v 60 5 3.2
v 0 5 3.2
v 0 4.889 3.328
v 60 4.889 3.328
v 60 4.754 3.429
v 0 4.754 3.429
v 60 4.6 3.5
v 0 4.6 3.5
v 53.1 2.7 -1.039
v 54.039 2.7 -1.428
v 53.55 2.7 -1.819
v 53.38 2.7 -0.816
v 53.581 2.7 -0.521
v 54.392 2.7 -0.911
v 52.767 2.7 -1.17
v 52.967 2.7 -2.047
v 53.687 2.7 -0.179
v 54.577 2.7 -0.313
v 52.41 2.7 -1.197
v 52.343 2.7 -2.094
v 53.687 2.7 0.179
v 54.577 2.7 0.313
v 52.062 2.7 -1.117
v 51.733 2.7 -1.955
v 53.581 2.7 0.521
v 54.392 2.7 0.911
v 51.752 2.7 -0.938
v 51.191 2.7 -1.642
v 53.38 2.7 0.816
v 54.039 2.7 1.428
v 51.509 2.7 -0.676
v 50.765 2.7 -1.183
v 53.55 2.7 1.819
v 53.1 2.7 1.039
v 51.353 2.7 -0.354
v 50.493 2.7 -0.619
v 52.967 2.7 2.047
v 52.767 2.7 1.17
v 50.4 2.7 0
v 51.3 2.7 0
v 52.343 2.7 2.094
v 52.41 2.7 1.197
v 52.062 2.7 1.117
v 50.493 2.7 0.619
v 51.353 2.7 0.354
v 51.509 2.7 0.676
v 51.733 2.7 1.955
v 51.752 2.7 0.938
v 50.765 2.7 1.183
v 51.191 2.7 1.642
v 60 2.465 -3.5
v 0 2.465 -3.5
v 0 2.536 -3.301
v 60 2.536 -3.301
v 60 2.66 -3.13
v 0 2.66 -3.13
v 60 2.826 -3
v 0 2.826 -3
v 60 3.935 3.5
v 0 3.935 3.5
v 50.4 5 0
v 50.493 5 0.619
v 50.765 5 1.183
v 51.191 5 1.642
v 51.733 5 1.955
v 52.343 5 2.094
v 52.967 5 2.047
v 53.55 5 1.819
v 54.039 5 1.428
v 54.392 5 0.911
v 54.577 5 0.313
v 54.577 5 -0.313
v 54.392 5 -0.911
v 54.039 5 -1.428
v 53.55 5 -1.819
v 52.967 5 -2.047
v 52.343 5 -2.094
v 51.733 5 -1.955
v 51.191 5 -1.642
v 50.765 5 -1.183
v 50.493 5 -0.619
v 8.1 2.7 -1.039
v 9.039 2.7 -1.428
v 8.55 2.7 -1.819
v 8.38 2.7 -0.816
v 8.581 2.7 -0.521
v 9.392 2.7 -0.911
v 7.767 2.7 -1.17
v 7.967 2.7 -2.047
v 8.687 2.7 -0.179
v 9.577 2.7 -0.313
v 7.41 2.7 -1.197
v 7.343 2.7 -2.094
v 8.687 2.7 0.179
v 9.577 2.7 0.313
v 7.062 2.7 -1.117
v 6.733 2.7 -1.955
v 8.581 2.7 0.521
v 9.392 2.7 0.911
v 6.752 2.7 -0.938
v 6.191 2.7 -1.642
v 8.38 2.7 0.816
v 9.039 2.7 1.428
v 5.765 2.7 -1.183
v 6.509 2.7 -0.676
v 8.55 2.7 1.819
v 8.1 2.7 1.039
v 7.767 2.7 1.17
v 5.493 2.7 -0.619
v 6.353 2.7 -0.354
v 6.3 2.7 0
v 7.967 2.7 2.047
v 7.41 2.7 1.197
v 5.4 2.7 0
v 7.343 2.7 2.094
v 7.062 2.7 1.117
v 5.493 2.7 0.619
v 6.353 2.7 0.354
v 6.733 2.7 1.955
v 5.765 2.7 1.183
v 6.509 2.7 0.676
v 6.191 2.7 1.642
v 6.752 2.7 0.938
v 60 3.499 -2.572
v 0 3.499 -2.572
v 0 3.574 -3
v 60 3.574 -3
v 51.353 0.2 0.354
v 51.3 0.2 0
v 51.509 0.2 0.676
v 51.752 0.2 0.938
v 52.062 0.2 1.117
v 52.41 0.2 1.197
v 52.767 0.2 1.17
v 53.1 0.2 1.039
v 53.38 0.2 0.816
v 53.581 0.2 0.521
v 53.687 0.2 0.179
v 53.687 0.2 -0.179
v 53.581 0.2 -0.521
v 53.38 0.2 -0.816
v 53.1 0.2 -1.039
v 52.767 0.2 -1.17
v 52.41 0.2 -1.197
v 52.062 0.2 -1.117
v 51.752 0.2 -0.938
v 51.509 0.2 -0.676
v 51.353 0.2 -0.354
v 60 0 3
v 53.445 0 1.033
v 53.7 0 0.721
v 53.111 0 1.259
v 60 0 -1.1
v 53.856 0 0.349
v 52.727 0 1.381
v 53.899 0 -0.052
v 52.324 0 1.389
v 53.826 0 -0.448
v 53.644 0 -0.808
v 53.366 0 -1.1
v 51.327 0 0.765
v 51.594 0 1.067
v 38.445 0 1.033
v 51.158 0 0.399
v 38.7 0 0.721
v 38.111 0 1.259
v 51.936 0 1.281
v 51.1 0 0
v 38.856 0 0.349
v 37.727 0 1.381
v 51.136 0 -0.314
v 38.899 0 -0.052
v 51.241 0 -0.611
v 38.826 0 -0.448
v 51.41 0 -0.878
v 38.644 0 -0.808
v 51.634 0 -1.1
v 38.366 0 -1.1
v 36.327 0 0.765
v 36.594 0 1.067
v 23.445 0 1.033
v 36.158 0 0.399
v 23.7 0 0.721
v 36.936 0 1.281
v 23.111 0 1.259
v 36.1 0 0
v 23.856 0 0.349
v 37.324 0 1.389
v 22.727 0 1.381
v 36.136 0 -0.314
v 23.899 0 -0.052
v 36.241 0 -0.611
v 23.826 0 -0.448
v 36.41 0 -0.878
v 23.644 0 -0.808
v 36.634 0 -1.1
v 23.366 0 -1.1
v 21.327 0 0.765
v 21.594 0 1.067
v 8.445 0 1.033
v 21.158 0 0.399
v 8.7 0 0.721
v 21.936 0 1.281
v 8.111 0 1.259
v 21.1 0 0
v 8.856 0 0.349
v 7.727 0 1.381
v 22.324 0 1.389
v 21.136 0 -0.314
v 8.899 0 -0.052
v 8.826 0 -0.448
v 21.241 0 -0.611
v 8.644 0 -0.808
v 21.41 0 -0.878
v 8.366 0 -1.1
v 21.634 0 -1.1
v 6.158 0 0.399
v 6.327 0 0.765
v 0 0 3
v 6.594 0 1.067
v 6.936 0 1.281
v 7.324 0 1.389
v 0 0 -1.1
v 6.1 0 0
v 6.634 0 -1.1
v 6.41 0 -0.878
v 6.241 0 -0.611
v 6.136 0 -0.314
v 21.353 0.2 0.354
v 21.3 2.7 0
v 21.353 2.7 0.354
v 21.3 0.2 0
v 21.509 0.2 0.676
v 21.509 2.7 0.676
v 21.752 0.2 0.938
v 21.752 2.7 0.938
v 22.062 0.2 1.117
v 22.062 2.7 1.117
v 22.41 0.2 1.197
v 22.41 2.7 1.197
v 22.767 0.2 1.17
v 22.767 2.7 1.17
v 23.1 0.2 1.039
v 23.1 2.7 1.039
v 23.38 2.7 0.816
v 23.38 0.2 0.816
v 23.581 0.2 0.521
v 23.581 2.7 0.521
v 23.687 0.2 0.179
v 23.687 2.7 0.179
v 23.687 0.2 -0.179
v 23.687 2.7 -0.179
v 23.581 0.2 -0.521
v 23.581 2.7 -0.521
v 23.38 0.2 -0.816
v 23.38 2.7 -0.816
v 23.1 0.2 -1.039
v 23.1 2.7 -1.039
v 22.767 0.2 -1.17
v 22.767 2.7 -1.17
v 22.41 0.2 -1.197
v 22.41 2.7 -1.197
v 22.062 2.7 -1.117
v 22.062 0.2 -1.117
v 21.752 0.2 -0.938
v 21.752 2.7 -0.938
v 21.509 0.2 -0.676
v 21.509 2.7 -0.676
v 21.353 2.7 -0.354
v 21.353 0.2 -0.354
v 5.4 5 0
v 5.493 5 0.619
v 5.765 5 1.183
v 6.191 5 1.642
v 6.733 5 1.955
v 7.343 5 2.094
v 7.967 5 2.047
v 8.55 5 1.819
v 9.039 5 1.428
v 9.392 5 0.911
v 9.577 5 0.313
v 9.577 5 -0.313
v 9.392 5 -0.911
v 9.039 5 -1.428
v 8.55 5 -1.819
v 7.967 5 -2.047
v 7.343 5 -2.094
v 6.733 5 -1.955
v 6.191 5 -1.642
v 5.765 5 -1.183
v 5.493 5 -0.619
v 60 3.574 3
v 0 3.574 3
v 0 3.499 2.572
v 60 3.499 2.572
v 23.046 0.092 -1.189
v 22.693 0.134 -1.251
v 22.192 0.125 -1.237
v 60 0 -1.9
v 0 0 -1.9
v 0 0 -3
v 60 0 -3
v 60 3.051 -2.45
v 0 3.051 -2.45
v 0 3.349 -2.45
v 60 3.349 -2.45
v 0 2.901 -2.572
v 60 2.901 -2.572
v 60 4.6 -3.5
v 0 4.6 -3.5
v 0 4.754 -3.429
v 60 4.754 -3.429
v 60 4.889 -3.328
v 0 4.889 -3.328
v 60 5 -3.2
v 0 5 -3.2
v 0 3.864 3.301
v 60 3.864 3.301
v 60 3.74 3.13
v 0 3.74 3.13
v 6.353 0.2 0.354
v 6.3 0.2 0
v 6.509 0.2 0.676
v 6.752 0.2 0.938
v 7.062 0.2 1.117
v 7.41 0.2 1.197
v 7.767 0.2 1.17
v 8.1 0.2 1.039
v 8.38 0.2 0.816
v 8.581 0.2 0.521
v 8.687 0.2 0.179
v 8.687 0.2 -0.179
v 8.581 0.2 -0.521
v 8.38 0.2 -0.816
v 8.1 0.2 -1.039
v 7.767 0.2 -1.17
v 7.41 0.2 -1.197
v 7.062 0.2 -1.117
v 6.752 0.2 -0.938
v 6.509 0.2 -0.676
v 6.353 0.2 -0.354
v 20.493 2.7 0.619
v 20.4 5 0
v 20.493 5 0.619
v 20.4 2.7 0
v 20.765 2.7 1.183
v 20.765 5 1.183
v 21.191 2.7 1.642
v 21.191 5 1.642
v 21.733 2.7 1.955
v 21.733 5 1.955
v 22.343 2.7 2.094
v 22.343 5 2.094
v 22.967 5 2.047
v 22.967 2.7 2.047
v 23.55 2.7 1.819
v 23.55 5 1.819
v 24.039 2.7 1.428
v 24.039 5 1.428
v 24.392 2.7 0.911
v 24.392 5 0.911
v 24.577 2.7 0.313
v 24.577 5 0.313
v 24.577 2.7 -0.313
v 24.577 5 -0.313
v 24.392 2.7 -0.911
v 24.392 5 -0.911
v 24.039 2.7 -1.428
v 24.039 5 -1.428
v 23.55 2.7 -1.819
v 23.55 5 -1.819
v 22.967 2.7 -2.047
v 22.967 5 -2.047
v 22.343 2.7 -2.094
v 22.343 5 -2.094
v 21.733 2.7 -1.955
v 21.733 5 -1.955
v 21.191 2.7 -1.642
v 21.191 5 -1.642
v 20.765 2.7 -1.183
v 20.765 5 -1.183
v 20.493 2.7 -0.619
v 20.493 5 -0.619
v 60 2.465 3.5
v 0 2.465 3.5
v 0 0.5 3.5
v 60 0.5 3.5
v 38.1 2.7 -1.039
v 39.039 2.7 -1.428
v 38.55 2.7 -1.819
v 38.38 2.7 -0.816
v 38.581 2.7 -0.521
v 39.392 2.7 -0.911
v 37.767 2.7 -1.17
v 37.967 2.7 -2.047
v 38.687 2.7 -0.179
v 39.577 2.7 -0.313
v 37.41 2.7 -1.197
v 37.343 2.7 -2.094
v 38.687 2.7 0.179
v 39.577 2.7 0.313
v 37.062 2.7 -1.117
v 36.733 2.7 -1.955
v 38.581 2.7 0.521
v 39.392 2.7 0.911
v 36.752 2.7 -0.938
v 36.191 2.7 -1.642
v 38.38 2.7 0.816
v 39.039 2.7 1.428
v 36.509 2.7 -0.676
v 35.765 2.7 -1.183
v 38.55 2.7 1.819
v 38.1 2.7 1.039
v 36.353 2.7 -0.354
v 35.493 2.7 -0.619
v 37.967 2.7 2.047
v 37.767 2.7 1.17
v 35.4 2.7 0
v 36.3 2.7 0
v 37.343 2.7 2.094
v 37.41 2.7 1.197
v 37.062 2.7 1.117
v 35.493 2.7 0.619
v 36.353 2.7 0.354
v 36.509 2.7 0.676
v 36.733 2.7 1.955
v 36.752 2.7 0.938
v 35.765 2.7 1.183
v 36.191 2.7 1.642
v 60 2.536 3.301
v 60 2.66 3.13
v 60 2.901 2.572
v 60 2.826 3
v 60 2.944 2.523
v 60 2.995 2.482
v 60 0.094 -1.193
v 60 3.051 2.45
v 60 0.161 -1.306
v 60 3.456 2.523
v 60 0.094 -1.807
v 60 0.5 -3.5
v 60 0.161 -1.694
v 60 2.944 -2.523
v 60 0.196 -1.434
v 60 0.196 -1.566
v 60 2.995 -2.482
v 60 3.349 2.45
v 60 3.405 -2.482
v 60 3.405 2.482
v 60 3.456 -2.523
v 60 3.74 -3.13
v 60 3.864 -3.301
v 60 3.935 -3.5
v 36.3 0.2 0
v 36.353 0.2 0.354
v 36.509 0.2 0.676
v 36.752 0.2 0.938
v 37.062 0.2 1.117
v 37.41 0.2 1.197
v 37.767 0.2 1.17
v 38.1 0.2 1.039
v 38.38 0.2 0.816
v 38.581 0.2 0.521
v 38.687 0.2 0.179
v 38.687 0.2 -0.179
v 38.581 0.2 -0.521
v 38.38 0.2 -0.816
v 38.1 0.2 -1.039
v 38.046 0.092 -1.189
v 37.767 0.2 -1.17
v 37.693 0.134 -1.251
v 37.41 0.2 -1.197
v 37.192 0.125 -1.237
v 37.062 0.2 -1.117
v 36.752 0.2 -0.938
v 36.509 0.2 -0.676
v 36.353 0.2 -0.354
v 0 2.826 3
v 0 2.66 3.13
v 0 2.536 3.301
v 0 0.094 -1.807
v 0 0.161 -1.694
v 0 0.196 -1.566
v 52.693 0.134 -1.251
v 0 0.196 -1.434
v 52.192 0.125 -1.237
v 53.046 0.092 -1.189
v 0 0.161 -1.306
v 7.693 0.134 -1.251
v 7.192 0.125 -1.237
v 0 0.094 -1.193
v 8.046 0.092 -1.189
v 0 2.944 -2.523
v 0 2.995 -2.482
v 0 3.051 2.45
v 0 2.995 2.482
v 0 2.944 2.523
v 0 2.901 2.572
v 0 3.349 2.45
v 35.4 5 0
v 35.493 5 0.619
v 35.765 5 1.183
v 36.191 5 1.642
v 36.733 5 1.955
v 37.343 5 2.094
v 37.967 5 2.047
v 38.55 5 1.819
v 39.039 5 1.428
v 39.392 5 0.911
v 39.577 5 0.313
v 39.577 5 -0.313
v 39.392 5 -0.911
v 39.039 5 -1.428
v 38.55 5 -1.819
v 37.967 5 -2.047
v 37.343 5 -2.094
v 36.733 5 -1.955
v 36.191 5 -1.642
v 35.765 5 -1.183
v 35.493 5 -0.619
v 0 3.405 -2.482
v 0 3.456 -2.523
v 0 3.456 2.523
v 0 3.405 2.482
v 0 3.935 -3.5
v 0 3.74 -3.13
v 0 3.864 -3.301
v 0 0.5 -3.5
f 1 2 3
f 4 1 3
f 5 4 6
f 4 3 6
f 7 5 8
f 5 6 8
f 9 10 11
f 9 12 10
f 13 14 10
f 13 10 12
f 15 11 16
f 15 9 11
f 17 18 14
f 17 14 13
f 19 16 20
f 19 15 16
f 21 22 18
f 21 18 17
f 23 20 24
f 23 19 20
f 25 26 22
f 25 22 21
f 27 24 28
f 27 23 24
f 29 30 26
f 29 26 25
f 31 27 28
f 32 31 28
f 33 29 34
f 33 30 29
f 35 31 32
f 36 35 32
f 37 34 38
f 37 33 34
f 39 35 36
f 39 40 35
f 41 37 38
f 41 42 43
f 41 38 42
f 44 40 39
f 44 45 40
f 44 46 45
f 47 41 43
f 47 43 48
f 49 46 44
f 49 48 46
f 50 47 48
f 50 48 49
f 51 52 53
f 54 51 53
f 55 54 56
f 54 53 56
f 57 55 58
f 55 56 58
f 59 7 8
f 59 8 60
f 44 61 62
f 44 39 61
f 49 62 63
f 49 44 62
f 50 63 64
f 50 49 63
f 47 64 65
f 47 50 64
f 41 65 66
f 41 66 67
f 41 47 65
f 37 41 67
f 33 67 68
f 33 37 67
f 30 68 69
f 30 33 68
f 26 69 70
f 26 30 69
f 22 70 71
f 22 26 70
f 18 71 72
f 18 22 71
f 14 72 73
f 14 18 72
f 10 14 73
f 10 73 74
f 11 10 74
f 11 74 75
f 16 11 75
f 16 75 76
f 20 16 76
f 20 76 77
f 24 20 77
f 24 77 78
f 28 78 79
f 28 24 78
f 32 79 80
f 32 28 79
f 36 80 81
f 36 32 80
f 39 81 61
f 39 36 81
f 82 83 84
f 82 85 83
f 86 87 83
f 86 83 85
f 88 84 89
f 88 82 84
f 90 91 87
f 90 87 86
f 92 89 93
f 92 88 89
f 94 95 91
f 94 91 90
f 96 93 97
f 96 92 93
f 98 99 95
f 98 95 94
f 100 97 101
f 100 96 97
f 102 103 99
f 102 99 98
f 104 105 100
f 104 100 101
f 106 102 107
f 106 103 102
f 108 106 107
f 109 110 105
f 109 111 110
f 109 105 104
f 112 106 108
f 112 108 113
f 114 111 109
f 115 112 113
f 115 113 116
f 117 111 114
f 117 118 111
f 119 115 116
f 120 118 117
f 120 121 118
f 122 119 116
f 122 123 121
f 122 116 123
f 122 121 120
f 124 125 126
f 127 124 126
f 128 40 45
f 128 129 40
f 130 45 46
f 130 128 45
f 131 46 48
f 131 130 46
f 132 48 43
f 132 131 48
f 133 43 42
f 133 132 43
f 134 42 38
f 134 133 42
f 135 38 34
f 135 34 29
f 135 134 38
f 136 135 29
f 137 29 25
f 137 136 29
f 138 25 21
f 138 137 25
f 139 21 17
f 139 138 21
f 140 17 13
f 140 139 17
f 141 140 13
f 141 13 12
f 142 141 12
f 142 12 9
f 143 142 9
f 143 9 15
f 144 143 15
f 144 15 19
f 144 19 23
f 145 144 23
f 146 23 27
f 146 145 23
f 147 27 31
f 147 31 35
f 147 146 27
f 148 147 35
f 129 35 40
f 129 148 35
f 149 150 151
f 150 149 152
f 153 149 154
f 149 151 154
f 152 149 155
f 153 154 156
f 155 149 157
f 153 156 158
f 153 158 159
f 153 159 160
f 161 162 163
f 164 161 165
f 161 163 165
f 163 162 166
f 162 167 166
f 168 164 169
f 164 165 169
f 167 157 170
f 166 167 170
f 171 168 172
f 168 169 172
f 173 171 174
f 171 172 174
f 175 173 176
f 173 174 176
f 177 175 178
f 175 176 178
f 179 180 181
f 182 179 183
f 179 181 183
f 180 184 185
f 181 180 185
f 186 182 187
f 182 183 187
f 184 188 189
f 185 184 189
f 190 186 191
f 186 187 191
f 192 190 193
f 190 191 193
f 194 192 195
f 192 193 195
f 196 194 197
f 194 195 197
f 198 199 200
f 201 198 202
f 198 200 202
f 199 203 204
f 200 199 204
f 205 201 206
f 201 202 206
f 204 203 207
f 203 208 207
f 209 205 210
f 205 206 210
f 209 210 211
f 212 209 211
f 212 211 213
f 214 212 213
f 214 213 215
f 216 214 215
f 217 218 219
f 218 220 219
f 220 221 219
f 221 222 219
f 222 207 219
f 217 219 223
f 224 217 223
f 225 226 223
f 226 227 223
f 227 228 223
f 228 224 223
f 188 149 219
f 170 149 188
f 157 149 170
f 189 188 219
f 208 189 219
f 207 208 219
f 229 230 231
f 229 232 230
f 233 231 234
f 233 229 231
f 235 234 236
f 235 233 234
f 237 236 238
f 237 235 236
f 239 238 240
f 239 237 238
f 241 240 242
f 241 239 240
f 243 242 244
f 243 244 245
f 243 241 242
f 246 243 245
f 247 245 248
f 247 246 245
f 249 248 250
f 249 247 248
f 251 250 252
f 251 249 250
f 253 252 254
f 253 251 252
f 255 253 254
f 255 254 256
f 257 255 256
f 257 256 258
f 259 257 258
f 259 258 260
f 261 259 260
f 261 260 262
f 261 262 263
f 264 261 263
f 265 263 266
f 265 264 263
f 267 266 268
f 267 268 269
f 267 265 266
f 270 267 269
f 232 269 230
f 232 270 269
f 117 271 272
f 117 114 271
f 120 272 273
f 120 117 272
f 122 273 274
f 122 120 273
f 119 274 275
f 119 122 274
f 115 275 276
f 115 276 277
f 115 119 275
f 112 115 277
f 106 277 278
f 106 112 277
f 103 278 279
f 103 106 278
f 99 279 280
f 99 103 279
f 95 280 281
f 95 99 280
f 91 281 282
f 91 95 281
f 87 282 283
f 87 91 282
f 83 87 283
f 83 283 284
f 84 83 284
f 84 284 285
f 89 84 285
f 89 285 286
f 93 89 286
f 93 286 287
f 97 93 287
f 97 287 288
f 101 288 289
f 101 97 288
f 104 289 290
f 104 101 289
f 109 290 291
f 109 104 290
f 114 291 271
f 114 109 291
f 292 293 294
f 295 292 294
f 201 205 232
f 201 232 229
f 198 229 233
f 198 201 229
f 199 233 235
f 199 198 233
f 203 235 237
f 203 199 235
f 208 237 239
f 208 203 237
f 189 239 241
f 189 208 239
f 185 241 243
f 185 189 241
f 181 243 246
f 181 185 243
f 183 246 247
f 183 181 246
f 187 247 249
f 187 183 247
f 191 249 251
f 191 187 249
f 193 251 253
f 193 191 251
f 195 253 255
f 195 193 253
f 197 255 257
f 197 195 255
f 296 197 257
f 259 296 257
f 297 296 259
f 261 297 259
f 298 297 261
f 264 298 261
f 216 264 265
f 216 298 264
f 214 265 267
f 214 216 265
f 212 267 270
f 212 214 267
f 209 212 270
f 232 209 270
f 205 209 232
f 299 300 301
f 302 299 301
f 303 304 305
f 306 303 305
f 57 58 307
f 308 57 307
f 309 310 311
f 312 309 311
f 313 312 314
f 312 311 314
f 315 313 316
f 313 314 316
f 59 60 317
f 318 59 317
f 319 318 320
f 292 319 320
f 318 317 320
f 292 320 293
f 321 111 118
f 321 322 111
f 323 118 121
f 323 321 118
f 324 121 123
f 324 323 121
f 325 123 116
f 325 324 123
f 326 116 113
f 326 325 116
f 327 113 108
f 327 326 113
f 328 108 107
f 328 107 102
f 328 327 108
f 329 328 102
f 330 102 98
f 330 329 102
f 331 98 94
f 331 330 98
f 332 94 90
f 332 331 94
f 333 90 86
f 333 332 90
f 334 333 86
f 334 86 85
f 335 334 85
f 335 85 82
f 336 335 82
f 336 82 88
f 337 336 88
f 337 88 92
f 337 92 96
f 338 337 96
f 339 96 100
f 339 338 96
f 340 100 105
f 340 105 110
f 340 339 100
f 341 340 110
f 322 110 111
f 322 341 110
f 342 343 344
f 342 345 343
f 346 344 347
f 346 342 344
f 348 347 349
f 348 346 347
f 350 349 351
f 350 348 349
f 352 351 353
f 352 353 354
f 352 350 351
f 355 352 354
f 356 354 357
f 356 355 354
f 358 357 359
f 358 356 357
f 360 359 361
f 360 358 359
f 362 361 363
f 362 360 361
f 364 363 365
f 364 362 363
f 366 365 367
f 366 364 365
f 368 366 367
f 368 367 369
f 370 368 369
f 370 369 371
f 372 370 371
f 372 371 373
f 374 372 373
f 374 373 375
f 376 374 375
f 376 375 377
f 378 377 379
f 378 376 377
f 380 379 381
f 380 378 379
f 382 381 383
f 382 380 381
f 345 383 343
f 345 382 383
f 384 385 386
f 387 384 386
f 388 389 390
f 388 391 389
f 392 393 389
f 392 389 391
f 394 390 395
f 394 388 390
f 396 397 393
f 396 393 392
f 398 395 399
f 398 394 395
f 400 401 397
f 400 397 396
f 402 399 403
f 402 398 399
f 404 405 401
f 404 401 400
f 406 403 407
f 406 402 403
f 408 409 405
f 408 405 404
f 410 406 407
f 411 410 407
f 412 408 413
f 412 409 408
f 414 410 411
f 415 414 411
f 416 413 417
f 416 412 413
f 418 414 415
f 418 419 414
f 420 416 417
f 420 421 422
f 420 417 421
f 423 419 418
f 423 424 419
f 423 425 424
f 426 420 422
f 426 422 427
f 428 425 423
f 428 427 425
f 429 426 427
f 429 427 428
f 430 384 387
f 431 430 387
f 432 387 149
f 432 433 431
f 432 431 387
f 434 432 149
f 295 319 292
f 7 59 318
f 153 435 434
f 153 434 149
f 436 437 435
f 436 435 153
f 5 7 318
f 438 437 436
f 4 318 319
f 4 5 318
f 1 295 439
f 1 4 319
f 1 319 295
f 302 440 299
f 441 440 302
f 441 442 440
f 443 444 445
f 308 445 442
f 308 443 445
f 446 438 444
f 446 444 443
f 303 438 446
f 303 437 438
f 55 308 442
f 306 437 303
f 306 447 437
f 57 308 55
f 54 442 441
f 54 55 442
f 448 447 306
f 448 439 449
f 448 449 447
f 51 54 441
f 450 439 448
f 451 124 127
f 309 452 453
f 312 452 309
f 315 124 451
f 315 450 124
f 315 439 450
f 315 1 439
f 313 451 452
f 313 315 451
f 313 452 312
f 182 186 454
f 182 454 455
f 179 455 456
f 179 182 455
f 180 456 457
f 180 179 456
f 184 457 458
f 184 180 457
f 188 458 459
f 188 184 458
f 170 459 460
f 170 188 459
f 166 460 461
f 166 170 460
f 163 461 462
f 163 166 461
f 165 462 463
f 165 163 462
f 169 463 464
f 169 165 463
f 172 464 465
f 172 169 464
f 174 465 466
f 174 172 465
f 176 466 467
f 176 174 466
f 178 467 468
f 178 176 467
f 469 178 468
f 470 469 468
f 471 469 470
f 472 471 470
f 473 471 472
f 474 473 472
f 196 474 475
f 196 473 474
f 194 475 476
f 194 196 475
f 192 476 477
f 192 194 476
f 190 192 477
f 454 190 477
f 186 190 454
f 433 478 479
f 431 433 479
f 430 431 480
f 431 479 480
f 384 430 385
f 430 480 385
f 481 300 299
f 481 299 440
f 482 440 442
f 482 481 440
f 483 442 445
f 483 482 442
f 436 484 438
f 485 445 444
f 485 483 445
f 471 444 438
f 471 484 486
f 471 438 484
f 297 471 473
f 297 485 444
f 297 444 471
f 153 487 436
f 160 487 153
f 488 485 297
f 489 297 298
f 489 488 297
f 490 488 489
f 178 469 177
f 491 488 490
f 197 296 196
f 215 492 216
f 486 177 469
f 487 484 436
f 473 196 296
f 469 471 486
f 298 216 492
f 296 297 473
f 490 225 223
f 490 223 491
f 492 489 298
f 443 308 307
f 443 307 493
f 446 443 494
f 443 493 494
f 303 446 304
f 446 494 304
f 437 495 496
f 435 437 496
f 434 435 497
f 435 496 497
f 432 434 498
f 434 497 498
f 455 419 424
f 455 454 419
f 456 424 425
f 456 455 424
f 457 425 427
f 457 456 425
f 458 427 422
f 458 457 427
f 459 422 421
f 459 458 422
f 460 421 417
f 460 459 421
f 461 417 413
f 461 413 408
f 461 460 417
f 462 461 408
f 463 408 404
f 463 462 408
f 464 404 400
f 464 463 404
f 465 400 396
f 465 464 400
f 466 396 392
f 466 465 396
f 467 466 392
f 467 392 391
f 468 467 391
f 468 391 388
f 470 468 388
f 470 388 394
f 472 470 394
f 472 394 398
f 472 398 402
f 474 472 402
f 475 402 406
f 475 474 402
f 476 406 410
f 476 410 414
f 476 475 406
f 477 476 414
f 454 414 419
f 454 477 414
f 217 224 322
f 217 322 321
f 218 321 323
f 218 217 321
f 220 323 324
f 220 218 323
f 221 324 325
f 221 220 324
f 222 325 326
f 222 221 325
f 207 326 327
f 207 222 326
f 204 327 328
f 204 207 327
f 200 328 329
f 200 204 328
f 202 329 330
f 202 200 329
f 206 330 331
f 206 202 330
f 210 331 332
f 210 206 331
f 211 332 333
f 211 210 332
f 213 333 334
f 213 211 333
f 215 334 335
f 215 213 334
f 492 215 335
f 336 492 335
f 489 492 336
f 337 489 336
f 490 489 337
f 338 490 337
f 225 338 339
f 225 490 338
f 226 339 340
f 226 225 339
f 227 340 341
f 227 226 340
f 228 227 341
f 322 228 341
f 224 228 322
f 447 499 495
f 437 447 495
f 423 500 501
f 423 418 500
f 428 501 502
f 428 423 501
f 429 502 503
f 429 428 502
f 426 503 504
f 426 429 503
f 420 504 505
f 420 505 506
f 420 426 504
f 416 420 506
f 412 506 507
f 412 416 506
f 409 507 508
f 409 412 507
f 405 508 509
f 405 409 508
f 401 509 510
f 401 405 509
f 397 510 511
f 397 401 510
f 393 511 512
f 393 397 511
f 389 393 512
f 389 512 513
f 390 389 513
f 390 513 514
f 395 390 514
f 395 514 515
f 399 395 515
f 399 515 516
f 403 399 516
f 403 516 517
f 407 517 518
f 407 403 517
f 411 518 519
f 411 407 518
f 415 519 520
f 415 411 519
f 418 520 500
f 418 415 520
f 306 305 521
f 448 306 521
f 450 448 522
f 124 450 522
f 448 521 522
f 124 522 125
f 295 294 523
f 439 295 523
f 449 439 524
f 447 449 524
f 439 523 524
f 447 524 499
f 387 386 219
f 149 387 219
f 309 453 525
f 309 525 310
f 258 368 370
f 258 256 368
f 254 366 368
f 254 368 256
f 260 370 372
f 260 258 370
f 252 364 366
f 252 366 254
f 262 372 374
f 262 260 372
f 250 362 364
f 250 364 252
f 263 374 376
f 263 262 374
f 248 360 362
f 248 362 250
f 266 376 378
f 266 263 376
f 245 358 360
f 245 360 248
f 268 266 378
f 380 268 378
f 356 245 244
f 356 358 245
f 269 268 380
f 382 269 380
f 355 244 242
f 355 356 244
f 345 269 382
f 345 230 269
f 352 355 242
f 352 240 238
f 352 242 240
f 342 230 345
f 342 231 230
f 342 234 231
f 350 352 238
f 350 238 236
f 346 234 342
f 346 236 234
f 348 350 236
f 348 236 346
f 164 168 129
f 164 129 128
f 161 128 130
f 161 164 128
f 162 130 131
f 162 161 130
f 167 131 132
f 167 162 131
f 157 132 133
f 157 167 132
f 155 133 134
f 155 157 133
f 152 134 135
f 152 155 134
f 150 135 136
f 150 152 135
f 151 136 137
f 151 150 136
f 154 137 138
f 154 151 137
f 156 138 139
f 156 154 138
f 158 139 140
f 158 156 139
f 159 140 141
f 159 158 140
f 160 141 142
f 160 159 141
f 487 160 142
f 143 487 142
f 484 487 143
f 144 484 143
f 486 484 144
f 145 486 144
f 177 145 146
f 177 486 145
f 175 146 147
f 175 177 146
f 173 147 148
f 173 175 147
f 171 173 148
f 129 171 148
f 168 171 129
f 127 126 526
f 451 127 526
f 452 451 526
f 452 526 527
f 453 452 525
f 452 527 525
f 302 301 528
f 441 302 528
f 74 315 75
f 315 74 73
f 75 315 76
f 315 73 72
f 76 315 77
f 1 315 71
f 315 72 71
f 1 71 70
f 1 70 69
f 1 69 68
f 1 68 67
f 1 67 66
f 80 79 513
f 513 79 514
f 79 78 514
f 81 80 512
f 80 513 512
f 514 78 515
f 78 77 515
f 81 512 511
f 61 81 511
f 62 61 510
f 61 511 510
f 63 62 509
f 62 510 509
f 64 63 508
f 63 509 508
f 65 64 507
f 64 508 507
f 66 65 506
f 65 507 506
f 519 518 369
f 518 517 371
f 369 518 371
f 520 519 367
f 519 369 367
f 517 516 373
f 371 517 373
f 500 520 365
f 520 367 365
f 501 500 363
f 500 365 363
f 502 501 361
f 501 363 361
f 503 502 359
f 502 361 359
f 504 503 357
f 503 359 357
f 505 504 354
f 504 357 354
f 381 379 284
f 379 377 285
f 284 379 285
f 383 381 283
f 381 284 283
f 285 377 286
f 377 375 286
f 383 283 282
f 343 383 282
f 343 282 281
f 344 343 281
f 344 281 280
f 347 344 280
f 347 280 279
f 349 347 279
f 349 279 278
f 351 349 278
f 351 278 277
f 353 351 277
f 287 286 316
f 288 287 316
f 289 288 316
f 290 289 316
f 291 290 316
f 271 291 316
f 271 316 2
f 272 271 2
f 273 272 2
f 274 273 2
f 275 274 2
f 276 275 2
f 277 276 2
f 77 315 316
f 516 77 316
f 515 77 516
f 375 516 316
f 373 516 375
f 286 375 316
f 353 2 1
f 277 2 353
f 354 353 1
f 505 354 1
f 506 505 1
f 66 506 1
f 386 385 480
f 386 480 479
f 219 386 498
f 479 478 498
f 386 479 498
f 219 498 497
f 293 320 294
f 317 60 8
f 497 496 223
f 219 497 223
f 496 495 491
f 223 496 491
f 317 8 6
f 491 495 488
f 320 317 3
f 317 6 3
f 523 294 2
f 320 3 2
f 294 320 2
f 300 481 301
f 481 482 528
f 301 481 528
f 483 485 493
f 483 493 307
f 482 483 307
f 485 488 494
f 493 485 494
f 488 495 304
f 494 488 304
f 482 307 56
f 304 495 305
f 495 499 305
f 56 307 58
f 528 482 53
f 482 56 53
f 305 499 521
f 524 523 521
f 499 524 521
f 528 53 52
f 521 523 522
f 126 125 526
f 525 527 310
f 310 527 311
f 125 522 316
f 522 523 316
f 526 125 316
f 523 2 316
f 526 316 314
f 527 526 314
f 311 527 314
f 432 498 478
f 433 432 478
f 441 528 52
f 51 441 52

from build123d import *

# Parameters (mm, degrees)
EXTRUDE1_DEPTH  = 60
SKETCH6_R       = 0.5
EXTRUDE2_DEPTH  = 61
LPATTERN1_COUNT = 3
LPATTERN1_PITCH = 15


with BuildPart() as part:
    # Sketch1 → Extrude1 (new body)
    with BuildSketch(Plane(origin=(0, 0, 0), x_dir=(0, 0, -1), z_dir=(1, 0, 0))):
        with BuildLine():
            Line((-3.5, 0.5), (-3, 0))
            Line((-3, 0), (3, 0))
            Line((3, 0), (3.5, 0.5))
            Line((3.5, 0.5), (3.5, 2.465153077))
            ThreePointArc((3.5, 2.465153077), (3.211148341, 2.591798371), (2.999904622, 2.826))
            Line((2.999904622, 2.826), (2.572, 2.90145113))
            ThreePointArc((2.572, 2.90145113), (2.501845147, 2.968757157), (2.45, 3.051))
            Line((2.45, 3.051), (2.45, 3.349))
            ThreePointArc((2.45, 3.349), (2.501845147, 3.431242843), (2.572, 3.49854887))
            Line((2.572, 3.49854887), (2.999904622, 3.574))
            ThreePointArc((2.999904622, 3.574), (3.211148341, 3.808201629), (3.5, 3.934846923))
            Line((3.5, 3.934846923), (3.5, 4.6))
            ThreePointArc((3.5, 4.6), (3.382052634, 4.824039475), (3.2, 5))
            Line((3.2, 5), (-3.2, 5))
            ThreePointArc((-3.2, 5), (-3.382052634, 4.824039475), (-3.5, 4.6))
            Line((-3.5, 4.6), (-3.5, 3.934846923))
            ThreePointArc((-3.5, 3.934846923), (-3.211148341, 3.808201629), (-2.999904622, 3.574))
            Line((-2.999904622, 3.574), (-2.572, 3.49854887))
            ThreePointArc((-2.572, 3.49854887), (-2.501845147, 3.431242843), (-2.45, 3.349))
            Line((-2.45, 3.349), (-2.45, 3.051))
            ThreePointArc((-2.45, 3.051), (-2.501845147, 2.968757157), (-2.572, 2.90145113))
            Line((-2.572, 2.90145113), (-2.999904622, 2.826))
            ThreePointArc((-2.999904622, 2.826), (-3.211148341, 2.591798371), (-3.5, 2.465153077))
            Line((-3.5, 2.465153077), (-3.5, 0.5))
        make_face()
    extrude(amount=EXTRUDE1_DEPTH)

    # Sketch2 → Cut-Revolve1 (revolve, cut)
    with BuildSketch(Plane(origin=(0, 0, 0), x_dir=(-1, 0, 0), z_dir=(0, 0, -1))):
        Polygon((-7.5, 5), (-5.4, 5), (-5.4, 2.7), (-6.3, 2.7), (-6.3, 0.2), (-6.1, 0), (-7.5, 0), align=None)
    revolve(axis=Axis((7.5, 0, 0), (0, 1, 0)), mode=Mode.SUBTRACT)

    # Sketch3 → Cut-Revolve2 (revolve, cut)
    with BuildSketch(Plane(origin=(45, 0, 0), x_dir=(-1, 0, 0), z_dir=(0, 0, -1))):
        Polygon((-7.5, 5), (-5.4, 5), (-5.4, 2.7), (-6.3, 2.7), (-6.3, 0.2), (-6.1, 0), (-7.5, 0), align=None)
    cut_revolve2 = revolve(axis=Axis((52.5, 0, 0), (0, 1, 0)), mode=Mode.SUBTRACT)

    # Sketch6 → Extrude2 (cut, through all)
    with BuildSketch(Plane(origin=(0, 0, 0), x_dir=(0, 0, -1), z_dir=(1, 0, 0))):
        with Locations((1.5, -0.3)):
            Circle(SKETCH6_R)
    extrude(amount=EXTRUDE2_DEPTH, mode=Mode.SUBTRACT)

    # LPattern1: Cut-Revolve2 ×3
    with Locations(*[(-i * LPATTERN1_PITCH, 0, 0) for i in range(1, LPATTERN1_COUNT)]):
        add(cut_revolve2, mode=Mode.SUBTRACT)


solid = part.part
